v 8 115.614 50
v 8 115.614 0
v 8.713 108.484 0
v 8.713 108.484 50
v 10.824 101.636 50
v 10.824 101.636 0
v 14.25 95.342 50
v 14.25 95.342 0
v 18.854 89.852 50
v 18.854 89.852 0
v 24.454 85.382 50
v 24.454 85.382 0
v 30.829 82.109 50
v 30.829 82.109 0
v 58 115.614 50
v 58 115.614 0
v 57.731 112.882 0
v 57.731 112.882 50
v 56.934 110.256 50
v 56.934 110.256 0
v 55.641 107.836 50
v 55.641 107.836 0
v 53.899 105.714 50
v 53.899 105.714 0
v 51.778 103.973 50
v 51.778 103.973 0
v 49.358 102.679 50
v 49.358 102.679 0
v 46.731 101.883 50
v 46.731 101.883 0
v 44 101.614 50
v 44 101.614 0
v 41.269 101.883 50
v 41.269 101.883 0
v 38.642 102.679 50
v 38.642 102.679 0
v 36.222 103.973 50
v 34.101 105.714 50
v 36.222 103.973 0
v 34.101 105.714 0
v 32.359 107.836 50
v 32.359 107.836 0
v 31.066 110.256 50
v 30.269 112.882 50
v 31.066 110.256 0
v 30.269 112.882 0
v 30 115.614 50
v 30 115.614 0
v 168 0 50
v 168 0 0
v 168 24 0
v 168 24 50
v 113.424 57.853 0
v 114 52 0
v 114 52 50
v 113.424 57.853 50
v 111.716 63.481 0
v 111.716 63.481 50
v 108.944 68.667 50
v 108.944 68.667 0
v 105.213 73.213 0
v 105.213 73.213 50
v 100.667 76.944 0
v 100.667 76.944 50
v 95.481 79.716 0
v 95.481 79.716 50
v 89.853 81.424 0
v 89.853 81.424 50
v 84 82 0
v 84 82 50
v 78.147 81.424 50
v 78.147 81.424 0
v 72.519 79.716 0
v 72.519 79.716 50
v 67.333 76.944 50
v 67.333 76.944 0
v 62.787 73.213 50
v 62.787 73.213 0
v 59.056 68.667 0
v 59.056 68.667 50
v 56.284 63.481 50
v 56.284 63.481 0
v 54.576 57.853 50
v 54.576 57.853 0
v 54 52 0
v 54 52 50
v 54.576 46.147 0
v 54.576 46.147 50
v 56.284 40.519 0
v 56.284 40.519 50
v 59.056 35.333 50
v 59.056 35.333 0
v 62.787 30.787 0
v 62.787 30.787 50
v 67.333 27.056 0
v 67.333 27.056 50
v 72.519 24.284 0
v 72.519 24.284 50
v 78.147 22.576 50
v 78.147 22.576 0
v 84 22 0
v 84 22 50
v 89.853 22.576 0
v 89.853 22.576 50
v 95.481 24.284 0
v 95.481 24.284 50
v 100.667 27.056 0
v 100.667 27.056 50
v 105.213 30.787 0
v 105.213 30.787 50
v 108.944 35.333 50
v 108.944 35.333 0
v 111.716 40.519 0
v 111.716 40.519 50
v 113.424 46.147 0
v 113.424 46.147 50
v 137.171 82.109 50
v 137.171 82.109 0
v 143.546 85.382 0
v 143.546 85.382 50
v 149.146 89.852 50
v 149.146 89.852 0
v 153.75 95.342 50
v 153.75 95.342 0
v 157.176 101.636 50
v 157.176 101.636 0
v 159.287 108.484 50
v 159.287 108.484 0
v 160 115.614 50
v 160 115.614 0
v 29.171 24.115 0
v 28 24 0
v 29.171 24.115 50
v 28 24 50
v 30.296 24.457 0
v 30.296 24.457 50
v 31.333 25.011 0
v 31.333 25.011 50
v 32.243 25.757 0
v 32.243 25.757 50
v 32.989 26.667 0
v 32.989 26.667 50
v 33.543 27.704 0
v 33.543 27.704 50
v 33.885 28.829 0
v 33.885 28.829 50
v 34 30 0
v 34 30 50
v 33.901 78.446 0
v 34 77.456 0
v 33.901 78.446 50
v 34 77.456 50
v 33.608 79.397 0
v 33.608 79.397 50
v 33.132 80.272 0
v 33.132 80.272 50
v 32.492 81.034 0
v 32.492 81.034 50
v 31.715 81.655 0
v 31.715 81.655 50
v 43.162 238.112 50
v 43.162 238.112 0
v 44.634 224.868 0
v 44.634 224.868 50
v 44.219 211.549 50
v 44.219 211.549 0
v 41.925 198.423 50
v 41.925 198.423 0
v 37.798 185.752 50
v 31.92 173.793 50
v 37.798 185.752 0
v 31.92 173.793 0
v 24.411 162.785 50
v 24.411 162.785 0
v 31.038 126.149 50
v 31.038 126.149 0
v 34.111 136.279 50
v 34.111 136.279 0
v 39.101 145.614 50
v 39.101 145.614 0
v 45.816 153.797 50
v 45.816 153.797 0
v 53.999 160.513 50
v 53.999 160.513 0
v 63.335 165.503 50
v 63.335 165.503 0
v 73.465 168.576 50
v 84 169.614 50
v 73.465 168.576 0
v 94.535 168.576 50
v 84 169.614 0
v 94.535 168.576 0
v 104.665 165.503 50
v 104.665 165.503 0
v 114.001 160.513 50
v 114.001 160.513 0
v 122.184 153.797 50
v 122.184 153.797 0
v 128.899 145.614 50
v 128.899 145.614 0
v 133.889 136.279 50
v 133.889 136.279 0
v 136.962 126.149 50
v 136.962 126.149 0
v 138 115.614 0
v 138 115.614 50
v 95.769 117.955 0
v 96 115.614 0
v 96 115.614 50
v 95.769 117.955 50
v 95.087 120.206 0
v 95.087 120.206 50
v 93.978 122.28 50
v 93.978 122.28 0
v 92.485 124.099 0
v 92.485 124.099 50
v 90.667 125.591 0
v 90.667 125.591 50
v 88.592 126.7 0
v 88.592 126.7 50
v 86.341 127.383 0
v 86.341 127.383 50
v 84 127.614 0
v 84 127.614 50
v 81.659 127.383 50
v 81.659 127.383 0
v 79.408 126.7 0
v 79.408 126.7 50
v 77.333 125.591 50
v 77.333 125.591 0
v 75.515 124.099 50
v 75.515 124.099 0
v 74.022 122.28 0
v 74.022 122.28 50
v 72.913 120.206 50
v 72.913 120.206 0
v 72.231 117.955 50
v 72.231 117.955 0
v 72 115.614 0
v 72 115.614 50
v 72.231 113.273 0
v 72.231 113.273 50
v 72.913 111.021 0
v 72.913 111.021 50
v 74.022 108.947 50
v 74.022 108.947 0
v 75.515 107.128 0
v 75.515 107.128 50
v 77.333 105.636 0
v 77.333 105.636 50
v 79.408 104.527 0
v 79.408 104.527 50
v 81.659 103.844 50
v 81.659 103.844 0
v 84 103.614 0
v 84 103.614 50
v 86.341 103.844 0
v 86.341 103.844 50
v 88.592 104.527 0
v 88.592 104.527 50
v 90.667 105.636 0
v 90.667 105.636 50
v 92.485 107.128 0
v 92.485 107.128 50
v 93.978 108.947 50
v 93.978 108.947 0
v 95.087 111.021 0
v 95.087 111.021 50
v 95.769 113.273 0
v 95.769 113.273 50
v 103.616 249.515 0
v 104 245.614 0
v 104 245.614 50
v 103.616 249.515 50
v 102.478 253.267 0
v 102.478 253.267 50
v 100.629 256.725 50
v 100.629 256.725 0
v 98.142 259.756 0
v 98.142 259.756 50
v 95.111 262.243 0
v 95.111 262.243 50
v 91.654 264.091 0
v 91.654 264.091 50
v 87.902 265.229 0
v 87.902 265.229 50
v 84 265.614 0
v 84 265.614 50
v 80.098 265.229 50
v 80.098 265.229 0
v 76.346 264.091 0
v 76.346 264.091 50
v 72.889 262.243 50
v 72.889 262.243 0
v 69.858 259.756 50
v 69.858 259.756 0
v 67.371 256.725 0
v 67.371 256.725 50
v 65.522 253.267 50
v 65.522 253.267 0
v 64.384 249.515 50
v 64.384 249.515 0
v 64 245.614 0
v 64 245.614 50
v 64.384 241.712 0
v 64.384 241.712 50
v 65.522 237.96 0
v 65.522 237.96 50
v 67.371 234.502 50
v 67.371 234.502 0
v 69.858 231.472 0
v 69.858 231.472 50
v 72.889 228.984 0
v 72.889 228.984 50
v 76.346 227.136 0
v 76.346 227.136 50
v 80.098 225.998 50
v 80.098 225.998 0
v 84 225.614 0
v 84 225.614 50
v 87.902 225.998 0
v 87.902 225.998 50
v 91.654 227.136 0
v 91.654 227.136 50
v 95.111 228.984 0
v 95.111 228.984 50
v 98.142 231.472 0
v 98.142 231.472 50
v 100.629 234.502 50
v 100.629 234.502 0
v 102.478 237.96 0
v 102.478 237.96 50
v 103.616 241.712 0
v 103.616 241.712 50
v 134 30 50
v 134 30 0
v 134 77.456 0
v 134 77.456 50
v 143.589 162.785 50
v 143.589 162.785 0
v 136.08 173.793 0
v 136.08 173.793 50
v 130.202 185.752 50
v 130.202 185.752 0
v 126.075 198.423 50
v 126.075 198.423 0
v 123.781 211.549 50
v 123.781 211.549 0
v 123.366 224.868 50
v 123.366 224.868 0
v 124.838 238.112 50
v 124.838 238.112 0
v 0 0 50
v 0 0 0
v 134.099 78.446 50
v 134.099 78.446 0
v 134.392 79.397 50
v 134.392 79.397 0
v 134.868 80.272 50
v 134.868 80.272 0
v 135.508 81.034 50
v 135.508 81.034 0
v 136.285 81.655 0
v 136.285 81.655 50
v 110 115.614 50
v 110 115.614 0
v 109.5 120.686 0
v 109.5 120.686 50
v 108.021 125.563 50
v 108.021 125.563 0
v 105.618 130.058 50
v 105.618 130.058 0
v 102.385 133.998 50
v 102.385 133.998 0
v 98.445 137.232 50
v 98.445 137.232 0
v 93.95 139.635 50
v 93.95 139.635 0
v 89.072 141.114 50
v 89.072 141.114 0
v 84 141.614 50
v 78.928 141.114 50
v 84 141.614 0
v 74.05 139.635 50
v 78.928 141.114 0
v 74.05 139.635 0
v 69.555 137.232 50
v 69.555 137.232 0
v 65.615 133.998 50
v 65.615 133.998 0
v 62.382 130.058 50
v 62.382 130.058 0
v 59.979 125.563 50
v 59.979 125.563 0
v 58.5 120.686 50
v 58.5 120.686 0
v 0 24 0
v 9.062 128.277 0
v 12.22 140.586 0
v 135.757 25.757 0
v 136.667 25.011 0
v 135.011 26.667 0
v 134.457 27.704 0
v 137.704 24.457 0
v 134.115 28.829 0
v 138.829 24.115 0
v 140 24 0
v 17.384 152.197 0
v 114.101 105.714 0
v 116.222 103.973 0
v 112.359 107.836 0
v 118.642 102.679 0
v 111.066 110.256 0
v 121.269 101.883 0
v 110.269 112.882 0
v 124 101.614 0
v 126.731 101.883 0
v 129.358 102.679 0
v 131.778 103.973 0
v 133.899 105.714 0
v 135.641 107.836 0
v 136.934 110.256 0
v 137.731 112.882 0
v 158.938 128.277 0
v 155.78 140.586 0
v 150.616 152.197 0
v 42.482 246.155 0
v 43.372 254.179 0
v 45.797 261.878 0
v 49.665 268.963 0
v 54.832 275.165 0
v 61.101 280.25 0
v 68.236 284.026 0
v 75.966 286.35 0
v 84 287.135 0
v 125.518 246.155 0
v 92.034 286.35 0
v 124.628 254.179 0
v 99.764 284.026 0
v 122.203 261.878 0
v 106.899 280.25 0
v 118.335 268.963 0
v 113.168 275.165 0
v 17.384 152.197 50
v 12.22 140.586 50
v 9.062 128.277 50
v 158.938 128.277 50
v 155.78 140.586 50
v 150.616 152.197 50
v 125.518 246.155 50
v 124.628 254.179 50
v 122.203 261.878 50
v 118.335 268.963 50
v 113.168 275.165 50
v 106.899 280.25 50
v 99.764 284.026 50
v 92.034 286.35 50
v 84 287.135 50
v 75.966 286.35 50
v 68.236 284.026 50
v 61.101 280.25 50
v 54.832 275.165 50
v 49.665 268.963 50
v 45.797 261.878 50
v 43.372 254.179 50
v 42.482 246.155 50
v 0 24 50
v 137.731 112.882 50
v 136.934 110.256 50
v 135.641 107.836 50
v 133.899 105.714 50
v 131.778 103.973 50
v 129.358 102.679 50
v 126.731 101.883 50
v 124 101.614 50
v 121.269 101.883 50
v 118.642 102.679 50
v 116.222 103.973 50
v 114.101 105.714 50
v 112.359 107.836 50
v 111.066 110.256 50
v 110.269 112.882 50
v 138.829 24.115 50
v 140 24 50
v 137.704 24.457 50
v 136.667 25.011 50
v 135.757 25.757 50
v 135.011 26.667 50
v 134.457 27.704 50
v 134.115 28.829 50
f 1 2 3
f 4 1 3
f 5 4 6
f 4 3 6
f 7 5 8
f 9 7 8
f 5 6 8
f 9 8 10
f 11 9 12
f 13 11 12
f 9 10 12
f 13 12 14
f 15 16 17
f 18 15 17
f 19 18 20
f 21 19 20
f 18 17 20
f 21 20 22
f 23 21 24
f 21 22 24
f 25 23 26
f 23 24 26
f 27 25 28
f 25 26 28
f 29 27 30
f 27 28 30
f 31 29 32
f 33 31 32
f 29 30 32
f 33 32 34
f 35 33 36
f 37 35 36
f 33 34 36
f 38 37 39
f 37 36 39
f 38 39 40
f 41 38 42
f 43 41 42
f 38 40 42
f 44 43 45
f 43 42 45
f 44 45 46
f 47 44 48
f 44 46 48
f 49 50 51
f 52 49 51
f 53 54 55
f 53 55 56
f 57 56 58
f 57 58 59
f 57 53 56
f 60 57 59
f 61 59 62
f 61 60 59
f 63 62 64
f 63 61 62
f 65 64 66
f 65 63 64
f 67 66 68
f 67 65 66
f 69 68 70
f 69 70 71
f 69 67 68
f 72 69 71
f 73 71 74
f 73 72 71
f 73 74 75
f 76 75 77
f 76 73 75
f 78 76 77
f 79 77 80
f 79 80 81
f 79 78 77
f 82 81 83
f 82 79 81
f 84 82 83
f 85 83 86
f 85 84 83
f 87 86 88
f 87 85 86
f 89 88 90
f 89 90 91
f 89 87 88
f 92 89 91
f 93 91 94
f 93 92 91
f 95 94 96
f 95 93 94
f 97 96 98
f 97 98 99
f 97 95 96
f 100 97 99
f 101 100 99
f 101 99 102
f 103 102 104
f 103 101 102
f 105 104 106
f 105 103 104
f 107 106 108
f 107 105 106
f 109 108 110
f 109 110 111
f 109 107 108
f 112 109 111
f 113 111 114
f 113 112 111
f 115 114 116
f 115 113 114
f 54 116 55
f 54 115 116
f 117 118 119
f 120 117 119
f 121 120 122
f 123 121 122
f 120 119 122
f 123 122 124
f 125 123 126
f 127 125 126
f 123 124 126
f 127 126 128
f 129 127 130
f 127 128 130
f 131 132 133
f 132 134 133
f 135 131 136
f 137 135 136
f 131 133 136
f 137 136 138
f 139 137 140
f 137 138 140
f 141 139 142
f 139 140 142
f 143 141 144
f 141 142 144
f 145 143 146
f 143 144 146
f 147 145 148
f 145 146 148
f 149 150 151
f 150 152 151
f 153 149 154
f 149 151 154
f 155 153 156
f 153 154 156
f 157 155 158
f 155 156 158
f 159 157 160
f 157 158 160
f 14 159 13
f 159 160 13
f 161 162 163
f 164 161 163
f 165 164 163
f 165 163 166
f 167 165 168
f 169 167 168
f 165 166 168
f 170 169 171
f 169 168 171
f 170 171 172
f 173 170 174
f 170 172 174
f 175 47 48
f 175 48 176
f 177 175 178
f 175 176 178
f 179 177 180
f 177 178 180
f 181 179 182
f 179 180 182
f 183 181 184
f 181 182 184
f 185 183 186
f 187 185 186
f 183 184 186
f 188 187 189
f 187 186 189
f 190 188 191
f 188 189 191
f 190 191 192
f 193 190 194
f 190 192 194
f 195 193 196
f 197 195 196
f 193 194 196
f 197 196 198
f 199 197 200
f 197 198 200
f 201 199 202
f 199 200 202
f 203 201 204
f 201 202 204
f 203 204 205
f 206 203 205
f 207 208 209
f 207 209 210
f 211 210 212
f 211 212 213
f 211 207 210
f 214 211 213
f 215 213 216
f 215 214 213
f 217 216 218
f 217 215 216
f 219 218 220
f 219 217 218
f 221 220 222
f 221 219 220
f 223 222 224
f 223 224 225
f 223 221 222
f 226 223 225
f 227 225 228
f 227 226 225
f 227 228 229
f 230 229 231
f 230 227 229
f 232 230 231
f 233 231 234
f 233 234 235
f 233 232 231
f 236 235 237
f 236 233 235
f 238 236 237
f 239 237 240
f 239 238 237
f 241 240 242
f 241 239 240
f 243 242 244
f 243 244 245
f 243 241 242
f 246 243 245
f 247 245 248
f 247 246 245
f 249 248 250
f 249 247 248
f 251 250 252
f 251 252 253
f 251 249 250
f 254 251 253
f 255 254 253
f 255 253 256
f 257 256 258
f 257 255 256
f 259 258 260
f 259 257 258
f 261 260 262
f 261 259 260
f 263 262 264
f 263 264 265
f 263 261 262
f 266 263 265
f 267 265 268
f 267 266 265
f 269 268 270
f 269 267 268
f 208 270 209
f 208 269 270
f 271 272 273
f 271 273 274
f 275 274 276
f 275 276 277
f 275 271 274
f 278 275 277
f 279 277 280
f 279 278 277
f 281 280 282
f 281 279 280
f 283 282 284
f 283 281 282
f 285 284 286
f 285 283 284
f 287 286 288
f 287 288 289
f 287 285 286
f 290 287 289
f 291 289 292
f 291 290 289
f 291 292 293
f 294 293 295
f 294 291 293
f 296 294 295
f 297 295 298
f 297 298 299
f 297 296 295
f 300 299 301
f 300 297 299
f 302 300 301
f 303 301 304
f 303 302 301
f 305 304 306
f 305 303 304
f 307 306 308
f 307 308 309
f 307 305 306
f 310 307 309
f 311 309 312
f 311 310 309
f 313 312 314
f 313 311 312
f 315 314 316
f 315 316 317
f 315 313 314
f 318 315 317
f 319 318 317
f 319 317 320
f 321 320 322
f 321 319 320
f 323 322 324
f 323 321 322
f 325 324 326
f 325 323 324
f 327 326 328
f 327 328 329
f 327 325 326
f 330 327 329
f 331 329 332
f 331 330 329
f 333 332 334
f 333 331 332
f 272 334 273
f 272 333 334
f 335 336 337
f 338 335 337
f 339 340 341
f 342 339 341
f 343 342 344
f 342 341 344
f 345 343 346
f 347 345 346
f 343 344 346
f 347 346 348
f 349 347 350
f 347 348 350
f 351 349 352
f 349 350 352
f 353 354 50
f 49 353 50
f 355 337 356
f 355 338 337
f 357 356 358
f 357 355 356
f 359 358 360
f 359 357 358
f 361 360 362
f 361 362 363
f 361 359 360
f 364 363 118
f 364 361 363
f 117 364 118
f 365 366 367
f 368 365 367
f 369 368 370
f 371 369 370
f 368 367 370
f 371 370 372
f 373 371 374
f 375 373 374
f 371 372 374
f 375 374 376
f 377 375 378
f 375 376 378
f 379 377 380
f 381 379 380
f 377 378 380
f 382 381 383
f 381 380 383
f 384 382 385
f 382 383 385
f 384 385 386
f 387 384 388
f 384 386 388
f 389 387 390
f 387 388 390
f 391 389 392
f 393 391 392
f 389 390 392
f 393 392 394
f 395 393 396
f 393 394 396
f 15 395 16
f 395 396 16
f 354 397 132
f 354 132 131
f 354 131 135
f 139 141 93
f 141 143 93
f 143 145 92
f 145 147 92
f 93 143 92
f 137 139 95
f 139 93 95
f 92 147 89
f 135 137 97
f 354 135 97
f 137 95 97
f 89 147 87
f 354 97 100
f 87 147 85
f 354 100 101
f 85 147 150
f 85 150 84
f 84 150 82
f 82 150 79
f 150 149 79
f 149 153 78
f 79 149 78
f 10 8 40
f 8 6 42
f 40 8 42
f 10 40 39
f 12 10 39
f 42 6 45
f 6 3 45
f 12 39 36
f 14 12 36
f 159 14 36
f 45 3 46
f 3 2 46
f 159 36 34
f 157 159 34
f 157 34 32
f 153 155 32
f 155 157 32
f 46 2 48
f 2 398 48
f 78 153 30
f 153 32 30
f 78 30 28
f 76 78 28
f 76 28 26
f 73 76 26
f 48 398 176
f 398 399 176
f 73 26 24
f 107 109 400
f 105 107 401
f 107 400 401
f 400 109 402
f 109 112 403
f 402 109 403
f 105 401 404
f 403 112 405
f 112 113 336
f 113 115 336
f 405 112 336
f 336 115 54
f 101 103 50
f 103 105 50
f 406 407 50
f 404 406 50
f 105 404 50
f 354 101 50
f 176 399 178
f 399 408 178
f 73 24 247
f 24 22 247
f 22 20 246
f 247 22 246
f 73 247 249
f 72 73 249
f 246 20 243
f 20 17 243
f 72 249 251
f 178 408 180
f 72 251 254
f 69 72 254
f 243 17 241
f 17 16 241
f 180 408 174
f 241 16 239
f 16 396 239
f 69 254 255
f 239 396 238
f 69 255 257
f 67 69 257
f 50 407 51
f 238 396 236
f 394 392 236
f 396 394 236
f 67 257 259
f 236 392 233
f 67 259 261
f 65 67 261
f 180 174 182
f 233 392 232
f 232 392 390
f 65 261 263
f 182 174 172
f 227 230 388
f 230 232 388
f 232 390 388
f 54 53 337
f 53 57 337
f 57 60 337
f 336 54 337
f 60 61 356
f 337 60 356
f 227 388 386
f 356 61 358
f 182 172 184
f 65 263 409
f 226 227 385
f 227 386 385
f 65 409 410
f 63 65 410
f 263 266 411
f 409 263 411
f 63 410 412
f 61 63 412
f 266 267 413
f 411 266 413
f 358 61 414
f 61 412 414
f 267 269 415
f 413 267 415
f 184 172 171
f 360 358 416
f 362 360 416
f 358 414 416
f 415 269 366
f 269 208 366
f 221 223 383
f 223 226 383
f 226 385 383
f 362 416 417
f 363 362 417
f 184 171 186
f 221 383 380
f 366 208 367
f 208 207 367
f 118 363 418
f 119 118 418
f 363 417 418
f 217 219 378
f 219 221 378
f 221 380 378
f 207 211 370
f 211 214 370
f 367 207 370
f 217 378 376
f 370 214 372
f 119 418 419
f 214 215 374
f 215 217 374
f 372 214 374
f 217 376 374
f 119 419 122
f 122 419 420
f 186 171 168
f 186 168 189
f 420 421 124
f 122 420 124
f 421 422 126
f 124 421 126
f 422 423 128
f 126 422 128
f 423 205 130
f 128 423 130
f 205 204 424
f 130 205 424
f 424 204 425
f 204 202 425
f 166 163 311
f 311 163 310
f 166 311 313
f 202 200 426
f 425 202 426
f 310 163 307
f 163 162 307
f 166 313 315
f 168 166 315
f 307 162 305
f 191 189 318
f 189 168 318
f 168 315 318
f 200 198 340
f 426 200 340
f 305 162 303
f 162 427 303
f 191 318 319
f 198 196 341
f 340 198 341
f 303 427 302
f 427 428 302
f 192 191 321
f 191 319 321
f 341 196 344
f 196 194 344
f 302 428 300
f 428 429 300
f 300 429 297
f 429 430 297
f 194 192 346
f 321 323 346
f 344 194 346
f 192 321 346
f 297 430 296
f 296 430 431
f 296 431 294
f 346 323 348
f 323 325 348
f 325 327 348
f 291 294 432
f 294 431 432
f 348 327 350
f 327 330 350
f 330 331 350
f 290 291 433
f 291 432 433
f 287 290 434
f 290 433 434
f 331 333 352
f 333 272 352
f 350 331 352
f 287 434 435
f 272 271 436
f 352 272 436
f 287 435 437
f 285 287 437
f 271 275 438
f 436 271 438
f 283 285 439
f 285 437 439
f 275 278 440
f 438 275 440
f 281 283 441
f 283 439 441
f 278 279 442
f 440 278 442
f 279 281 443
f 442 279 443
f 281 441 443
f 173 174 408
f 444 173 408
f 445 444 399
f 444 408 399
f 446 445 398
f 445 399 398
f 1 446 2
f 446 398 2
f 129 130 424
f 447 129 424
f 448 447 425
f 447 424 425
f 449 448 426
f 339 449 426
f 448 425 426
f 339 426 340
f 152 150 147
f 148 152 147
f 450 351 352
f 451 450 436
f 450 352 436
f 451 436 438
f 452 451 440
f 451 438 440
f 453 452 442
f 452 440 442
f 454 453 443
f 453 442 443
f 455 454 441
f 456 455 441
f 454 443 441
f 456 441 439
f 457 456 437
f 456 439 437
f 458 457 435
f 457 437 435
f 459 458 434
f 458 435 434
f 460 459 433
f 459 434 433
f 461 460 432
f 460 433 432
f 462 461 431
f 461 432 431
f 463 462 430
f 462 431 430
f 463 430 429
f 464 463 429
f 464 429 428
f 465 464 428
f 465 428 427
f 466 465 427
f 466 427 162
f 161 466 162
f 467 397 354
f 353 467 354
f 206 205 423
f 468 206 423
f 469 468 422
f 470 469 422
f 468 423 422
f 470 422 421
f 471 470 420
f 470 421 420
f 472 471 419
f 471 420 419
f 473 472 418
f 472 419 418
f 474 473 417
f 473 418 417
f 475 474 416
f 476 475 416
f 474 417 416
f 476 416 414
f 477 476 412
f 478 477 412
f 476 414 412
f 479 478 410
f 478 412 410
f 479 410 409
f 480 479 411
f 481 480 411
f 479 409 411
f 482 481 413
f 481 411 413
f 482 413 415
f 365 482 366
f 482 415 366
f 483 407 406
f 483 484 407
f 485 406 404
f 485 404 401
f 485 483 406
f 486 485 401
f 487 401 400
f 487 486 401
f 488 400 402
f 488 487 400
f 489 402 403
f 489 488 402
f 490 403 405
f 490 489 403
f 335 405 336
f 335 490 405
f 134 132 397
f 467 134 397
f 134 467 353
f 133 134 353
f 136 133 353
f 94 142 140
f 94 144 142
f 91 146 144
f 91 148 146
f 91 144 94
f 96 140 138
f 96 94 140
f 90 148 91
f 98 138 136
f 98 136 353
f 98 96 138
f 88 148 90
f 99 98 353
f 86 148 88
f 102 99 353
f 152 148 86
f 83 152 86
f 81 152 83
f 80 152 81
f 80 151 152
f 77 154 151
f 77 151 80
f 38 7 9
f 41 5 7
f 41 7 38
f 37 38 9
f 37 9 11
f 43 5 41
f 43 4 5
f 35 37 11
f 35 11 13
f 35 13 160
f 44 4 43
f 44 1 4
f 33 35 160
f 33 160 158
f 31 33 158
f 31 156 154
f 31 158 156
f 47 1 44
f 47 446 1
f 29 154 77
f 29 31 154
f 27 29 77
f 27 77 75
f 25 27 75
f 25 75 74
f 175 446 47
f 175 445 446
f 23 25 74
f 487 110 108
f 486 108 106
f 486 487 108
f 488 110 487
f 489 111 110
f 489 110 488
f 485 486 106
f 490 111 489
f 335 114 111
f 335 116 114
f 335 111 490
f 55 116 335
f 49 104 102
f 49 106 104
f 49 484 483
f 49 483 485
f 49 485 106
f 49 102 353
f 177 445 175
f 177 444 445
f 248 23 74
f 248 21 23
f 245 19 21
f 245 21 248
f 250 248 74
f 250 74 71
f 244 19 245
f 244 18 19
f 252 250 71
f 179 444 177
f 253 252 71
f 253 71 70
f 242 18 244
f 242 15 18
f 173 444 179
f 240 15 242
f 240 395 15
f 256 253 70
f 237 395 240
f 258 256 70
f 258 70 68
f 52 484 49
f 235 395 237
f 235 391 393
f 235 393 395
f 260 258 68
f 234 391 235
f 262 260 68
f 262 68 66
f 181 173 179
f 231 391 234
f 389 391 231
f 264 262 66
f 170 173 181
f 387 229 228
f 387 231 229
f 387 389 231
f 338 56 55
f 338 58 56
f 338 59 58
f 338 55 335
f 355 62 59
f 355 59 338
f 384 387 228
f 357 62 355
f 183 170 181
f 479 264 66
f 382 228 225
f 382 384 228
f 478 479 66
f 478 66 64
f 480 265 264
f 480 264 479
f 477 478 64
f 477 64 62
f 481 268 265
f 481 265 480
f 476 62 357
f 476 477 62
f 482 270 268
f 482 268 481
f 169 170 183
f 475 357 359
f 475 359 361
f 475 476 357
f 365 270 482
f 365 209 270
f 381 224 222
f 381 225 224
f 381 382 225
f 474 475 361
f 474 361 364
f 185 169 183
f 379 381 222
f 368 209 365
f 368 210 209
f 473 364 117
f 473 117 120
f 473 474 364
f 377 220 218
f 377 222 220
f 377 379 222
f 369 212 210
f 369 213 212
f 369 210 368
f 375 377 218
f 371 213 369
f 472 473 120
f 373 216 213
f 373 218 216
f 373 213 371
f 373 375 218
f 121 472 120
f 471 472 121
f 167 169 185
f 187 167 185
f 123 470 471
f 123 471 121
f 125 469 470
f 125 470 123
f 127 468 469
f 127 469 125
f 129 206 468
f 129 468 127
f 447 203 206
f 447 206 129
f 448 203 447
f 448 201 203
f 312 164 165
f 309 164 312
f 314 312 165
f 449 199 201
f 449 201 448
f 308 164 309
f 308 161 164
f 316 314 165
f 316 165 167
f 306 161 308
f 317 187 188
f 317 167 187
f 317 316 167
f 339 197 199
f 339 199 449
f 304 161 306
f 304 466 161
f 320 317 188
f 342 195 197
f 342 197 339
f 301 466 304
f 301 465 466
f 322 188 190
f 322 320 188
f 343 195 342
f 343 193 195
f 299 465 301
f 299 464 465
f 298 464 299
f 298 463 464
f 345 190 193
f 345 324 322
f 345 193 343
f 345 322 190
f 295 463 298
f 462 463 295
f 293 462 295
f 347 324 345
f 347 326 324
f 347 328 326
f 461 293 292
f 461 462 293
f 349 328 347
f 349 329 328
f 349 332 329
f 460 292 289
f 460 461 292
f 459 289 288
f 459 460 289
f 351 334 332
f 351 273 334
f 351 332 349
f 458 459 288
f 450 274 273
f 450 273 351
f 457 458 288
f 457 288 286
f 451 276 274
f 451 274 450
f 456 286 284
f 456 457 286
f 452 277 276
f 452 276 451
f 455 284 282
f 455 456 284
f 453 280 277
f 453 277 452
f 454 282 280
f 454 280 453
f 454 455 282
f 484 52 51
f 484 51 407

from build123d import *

# Parameters (mm, degrees)
SKETCH1_R           = 30
SKETCH1_R_2         = 12
SKETCH1_R_3         = 20
BOSS_EXTRUDE1_DEPTH = 50
FILLET1_R           = 6
FILLET2_R           = 5


with BuildPart() as part:
    # Sketch1 → Boss-Extrude1 (new body)
    with BuildSketch(Plane.XY):
        with BuildLine():
            Line((0, 0), (168, 0))
            Line((168, 0), (168, 24))
            Line((168, 24), (134, 24))
            Line((134, 24), (134, 81.030415331))
            ThreePointArc((134, 81.030415331), (152.77498914, 93.98034061), (160, 115.613648263))
            ThreePointArc((160, 115.613648263), (155.780100416, 140.585976635), (143.589021465, 162.785128215))
            ThreePointArc((143.589021465, 162.785128215), (126.074856949, 198.422570769), (124.838141772, 238.111911984))
            ThreePointArc((124.838141772, 238.111911984), (84, 287.13508695), (43.161858228, 238.111911984))
            ThreePointArc((43.161858228, 238.111911984), (41.925143051, 198.422570769), (24.410978535, 162.785128215))
            ThreePointArc((24.410978535, 162.785128215), (12.219899584, 140.585976635), (8, 115.613648263))
            ThreePointArc((8, 115.613648263), (15.22501086, 93.98034061), (34, 81.030415331))
            Line((34, 81.030415331), (34, 24))
            Line((34, 24), (0, 24))
            Line((0, 24), (0, 0))
        make_face()
        with Locations((84, 52)):
            Circle(SKETCH1_R, mode=Mode.SUBTRACT)
        with Locations((84, 115.613648263)):
            Circle(SKETCH1_R_2, mode=Mode.SUBTRACT)
        with Locations((84, 245.613648263)):
            Circle(SKETCH1_R_3, mode=Mode.SUBTRACT)
        with BuildLine():
            ThreePointArc((110, 115.613648263), (84, 141.613648263), (58, 115.613648263))
            ThreePointArc((58, 115.613648263), (44, 101.613648263), (30, 115.613648263))
            ThreePointArc((30, 115.613648263), (84, 169.613648263), (138, 115.613648263))
            ThreePointArc((138, 115.613648263), (124, 101.613648263), (110, 115.613648263))
        make_face(mode=Mode.SUBTRACT)
    extrude(amount=BOSS_EXTRUDE1_DEPTH)

    # Fillet1
    fillet1_edges = [part.edges().sort_by_distance(p)[0] for p in [
        (34, 24, 25),
        (134, 24, 25),
    ]]
    fillet(fillet1_edges, radius=FILLET1_R)

    # Fillet2
    fillet2_edges = [part.edges().sort_by_distance(p)[0] for p in [
        (34, 81.030415331, 25),
        (134, 81.030415331, 25),
    ]]
    fillet(fillet2_edges, radius=FILLET2_R)


solid = part.part
